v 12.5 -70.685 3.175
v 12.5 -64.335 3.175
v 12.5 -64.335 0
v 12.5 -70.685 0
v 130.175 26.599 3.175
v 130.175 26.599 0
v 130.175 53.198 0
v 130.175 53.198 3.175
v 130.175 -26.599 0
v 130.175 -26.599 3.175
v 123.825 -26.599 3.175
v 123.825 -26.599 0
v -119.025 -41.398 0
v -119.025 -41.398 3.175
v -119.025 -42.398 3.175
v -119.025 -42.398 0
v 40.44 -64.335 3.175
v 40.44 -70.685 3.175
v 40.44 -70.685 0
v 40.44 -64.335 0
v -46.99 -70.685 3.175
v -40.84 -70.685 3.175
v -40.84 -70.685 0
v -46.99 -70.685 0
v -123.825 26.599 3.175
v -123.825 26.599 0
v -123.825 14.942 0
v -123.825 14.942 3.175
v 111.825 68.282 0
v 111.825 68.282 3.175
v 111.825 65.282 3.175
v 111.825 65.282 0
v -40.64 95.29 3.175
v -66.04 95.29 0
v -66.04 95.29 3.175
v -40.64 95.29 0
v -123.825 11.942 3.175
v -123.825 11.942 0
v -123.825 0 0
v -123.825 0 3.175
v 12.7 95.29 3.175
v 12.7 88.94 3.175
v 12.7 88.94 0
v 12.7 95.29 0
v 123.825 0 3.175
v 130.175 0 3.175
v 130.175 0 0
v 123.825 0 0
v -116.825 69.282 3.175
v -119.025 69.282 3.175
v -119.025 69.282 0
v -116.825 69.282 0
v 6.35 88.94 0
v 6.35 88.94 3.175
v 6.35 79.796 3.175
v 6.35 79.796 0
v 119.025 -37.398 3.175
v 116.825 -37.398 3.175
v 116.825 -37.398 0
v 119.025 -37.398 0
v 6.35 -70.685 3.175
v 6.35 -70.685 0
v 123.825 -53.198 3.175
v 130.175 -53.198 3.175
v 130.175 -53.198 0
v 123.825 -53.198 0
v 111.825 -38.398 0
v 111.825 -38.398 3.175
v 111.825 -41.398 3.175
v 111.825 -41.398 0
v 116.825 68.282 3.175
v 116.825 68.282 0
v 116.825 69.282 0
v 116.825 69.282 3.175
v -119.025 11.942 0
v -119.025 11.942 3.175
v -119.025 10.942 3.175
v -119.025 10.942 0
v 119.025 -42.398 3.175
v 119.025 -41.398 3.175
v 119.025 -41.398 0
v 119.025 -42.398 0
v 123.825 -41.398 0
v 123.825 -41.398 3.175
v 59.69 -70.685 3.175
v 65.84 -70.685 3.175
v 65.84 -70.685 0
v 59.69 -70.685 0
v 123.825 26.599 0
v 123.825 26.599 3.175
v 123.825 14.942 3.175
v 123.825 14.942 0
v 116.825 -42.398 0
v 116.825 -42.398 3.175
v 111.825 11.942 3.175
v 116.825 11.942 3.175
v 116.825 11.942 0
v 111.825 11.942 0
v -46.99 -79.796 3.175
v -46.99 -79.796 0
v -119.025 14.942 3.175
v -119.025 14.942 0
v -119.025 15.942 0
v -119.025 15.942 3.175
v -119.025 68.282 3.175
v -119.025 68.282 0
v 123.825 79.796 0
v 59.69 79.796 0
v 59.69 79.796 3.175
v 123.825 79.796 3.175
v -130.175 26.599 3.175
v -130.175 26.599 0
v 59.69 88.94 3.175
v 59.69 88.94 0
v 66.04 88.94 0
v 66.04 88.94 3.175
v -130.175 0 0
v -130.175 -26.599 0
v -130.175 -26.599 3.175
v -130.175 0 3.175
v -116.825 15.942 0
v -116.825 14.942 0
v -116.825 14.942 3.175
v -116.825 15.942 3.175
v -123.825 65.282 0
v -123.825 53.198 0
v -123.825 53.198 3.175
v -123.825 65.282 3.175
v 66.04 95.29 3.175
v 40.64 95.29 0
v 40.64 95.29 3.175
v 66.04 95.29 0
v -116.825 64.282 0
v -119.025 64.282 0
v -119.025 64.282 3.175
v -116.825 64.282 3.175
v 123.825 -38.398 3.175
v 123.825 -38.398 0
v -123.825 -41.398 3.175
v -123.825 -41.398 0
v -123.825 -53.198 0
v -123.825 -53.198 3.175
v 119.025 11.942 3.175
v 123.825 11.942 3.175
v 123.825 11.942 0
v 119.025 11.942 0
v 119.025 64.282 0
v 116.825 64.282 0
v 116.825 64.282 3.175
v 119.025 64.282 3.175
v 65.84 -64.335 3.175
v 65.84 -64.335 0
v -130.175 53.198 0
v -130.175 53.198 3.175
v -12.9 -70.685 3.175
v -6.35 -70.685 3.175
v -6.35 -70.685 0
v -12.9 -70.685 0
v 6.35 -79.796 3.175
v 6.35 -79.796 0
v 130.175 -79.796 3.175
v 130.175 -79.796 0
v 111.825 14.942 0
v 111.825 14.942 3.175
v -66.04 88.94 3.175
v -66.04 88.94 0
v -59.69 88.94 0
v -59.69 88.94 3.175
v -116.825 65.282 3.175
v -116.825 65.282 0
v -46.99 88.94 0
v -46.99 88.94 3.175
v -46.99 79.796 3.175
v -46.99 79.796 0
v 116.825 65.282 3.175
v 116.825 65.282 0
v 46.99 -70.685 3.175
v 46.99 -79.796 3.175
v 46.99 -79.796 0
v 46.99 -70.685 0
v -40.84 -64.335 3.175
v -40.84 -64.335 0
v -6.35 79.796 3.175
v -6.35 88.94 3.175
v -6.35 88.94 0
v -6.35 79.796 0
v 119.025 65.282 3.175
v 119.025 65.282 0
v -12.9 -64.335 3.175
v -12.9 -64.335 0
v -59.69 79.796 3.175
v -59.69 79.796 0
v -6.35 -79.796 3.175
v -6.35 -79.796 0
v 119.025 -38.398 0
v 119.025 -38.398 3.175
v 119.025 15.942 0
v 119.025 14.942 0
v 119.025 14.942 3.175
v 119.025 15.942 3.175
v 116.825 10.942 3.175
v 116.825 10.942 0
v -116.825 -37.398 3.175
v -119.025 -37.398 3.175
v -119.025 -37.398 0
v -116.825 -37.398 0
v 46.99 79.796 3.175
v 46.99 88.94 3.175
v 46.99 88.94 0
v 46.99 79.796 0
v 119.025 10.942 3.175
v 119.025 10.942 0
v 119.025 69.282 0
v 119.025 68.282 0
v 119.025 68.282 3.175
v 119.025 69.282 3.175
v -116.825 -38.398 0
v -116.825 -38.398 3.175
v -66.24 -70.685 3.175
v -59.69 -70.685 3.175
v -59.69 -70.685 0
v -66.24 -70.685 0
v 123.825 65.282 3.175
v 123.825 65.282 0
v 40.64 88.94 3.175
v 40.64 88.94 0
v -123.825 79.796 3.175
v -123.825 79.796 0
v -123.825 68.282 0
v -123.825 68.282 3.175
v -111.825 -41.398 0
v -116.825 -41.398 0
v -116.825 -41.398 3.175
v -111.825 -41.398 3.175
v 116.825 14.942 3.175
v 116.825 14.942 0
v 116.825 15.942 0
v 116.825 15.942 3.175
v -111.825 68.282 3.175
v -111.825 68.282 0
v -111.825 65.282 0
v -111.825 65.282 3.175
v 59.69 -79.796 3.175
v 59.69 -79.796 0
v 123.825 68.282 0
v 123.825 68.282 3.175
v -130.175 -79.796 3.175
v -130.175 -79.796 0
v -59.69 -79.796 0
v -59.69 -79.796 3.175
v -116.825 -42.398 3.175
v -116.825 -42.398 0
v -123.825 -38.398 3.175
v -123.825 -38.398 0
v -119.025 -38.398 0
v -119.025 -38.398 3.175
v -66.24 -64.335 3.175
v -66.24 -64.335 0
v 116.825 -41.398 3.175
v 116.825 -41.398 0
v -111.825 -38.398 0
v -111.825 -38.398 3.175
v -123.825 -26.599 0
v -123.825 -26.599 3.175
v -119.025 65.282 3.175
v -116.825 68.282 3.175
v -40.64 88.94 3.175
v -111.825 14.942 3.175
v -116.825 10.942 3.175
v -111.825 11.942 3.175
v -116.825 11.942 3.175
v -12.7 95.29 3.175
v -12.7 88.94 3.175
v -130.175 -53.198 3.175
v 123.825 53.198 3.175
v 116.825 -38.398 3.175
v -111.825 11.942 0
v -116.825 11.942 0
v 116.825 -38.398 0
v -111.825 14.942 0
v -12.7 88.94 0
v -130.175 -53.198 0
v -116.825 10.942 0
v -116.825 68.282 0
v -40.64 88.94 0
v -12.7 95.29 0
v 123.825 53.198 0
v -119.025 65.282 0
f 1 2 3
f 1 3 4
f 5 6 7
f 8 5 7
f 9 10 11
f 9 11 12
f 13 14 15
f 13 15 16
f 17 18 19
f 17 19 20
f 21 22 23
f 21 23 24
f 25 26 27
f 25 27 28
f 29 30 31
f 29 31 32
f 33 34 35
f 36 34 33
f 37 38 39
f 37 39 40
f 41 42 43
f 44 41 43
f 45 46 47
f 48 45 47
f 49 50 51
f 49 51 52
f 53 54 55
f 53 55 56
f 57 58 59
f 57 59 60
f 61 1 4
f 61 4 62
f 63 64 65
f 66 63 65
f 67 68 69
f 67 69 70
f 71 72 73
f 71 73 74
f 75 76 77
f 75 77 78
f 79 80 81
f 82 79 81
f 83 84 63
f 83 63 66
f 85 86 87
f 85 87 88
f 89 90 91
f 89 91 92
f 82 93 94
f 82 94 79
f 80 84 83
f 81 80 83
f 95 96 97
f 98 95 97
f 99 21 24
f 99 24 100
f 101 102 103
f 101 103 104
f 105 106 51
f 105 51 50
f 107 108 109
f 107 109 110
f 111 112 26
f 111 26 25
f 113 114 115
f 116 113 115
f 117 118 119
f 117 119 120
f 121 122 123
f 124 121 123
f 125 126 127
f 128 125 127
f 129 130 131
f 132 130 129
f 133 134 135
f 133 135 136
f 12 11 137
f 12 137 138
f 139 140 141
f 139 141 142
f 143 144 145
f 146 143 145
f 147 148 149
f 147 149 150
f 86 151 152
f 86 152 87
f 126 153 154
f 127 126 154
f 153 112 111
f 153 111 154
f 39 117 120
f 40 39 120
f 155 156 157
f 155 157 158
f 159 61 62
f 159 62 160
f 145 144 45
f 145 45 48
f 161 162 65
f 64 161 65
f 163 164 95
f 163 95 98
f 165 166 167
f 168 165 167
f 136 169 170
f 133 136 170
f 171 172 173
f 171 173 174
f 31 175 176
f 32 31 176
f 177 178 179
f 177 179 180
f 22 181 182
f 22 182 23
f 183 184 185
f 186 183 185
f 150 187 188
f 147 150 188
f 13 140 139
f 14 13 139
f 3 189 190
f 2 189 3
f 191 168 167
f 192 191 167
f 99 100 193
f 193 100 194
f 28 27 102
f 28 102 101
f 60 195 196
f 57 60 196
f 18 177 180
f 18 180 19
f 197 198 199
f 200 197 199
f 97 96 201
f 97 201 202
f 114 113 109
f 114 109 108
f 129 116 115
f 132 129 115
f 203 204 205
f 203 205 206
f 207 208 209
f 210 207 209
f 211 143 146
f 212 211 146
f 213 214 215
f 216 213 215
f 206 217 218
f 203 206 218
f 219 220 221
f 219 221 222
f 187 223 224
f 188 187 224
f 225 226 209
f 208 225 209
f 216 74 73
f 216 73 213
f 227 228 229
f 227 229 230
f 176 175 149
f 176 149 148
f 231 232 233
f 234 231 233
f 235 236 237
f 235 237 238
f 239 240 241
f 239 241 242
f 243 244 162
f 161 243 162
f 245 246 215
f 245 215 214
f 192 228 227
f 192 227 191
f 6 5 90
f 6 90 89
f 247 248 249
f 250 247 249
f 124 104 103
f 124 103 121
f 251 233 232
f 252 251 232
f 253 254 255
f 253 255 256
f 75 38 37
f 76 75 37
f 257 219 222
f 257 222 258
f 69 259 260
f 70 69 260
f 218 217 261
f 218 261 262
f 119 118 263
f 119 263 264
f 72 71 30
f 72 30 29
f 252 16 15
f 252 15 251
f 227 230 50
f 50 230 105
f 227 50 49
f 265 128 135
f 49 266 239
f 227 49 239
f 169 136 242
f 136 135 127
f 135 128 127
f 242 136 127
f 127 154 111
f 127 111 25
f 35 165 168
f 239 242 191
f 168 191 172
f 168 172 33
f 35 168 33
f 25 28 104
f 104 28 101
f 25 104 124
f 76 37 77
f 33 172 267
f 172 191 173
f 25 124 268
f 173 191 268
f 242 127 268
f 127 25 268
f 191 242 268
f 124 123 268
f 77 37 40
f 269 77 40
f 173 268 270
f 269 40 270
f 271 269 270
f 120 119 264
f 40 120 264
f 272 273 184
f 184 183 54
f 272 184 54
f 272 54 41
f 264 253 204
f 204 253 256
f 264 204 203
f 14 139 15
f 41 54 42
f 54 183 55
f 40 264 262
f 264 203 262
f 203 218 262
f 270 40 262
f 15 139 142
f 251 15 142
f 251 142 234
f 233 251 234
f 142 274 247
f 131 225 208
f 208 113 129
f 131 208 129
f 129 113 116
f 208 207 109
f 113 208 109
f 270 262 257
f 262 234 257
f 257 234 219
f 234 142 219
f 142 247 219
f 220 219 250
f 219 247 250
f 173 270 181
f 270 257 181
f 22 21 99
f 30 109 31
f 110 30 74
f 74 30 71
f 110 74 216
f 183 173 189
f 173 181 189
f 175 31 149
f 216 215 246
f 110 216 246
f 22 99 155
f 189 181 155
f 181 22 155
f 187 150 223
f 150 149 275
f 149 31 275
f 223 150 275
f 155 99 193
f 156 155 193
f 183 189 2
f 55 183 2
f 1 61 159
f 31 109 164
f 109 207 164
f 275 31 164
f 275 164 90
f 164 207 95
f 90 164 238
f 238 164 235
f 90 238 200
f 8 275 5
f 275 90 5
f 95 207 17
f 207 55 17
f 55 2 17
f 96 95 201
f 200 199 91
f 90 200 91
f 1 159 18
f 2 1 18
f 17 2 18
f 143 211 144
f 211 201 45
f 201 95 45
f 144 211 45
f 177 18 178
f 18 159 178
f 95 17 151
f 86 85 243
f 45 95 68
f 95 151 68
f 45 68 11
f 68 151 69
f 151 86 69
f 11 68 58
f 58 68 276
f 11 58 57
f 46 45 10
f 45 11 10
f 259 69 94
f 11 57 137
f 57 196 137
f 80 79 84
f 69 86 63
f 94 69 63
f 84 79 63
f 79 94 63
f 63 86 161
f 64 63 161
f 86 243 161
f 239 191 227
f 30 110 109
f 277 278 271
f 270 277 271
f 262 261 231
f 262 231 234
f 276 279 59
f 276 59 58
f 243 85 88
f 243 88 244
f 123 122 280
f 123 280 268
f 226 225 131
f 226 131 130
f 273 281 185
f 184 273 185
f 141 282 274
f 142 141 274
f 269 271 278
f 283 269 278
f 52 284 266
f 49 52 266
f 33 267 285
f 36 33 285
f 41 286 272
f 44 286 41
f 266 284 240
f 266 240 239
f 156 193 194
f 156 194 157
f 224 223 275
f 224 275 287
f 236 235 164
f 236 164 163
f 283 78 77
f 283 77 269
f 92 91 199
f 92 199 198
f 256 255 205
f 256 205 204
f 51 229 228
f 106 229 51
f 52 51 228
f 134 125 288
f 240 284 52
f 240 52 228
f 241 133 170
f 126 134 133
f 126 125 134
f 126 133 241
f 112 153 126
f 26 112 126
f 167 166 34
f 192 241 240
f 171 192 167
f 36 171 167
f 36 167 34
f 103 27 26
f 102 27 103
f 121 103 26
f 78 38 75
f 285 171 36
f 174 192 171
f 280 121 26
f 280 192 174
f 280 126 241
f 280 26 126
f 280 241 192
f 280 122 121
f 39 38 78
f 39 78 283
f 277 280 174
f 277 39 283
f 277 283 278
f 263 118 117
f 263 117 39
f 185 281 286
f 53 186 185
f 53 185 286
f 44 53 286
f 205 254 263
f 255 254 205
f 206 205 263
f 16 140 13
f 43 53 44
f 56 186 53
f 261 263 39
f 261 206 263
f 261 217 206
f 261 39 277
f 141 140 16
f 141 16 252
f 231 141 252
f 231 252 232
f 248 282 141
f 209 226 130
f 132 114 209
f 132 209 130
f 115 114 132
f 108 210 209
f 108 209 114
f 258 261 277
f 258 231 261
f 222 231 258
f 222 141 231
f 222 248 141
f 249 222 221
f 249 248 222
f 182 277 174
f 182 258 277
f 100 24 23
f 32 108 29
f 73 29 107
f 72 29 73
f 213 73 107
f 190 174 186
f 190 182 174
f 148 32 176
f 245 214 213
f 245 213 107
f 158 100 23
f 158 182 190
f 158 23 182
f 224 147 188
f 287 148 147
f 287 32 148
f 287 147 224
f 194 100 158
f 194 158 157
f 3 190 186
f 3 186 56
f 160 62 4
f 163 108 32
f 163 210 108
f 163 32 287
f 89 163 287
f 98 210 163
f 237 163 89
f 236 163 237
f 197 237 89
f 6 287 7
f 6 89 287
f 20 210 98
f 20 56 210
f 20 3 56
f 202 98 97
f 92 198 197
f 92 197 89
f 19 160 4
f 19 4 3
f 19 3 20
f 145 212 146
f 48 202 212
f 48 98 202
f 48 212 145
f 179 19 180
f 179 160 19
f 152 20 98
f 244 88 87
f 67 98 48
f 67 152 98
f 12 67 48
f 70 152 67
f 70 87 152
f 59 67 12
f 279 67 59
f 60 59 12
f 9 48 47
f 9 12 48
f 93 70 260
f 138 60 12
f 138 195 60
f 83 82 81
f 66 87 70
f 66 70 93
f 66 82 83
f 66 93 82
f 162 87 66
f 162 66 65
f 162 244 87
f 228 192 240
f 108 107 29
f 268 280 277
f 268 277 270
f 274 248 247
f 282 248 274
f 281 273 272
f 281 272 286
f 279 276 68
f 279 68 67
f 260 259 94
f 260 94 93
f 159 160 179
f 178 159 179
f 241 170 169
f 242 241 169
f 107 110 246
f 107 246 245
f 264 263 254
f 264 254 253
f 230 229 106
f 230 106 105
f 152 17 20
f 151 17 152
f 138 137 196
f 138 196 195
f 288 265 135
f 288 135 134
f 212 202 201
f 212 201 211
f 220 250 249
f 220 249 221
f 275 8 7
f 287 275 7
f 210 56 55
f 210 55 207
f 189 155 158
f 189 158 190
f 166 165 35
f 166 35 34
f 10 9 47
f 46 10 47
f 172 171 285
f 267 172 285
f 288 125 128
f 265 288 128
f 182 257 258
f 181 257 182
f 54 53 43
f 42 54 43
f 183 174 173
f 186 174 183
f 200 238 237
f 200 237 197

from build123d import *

# Parameters (mm, degrees)
SKETCH1_W           = 260.35
SKETCH1_H           = 159.592906802
BOSS_EXTRUDE1_DEPTH = 3.175
SKETCH2_W           = 3.175
SKETCH2_H           = 26.5988178
CUT_EXTRUDE1_DEPTH  = 6.35
LPATTERN1_COUNT     = 3
LPATTERN1_PITCH     = 53.19763554
SKETCH3_W           = 3.175
SKETCH3_H           = 26.59881777
CUT_EXTRUDE3_DEPTH  = 6.35
LPATTERN3_COUNT     = 3
LPATTERN3_PITCH     = 53.19763554
SKETCH5_W           = 3.175
SKETCH5_H           = 3
CUT_EXTRUDE4_DEPTH  = 12
SKETCH6_W           = 2.2
SKETCH6_H           = 3.175
CUT_EXTRUDE5_DEPTH  = 1
SKETCH8_W           = 2.2
SKETCH8_H           = 3.175
CUT_EXTRUDE6_DEPTH  = 1
LPATTERN5_COUNT     = 3
LPATTERN5_PITCH     = 53.34
SKETCH9_W           = 3.175
SKETCH9_H           = 3
CUT_EXTRUDE7_DEPTH  = 12
SKETCH10_W          = 2.2
SKETCH10_H          = 3.175
CUT_EXTRUDE8_DEPTH  = 1
SKETCH11_W          = 2.2
SKETCH11_H          = 3.175
CUT_EXTRUDE9_DEPTH  = 1
LPATTERN6_COUNT     = 3
LPATTERN6_PITCH     = 53.34
CUT_EXTRUDE10_DEPTH = 153.718974674
LPATTERN7_COUNT     = 2
LPATTERN7_PITCH     = 53.34
LPATTERN8_COUNT     = 2
LPATTERN8_PITCH     = 53.34
SKETCH15_W          = 12.7
SKETCH15_H          = 3.175
BOSS_EXTRUDE2_DEPTH = 9.144
SKETCH16_W          = 25.4
SKETCH16_H          = 3.175
BOSS_EXTRUDE3_DEPTH = 6.35
LPATTERN9_COUNT     = 2
LPATTERN9_PITCH     = 53.34
LPATTERN10_COUNT    = 2
LPATTERN10_PITCH    = 53.34


with BuildPart() as part:
    # Sketch1 → Boss-Extrude1 (new body)
    with BuildSketch(Plane.XY):
        Rectangle(SKETCH1_W, SKETCH1_H)
    extrude(amount=BOSS_EXTRUDE1_DEPTH)

    # Sketch2 → Cut-Extrude1 (cut)
    with BuildSketch(Plane.ZY.offset(130.175)):
        with Locations((1.5875, 66.497044501)):
            Rectangle(SKETCH2_W, SKETCH2_H)
    cut_extrude1 = extrude(amount=-CUT_EXTRUDE1_DEPTH, mode=Mode.SUBTRACT)

    # LPattern1: Cut-Extrude1 ×3
    with Locations(*[(0, -i * LPATTERN1_PITCH, 0) for i in range(1, LPATTERN1_COUNT)]):
        add(cut_extrude1, mode=Mode.SUBTRACT)

    # Sketch3 → Cut-Extrude3 (cut)
    with BuildSketch(Plane(origin=(130.175, 0, 0), x_dir=(0, 0, -1), z_dir=(1, 0, 0))):
        with Locations((-1.5875, -39.898226818)):
            Rectangle(SKETCH3_W, SKETCH3_H)
    cut_extrude3 = extrude(amount=-CUT_EXTRUDE3_DEPTH, mode=Mode.SUBTRACT)

    # LPattern3: Cut-Extrude3 ×3
    with Locations(*[(0, i * LPATTERN3_PITCH, 0) for i in range(1, LPATTERN3_COUNT)]):
        add(cut_extrude3, mode=Mode.SUBTRACT)

    # Sketch5 → Cut-Extrude4 (cut)
    with BuildSketch(Plane.ZY.offset(123.825)):
        with Locations((1.5875, -39.898226579)):
            Rectangle(SKETCH5_W, SKETCH5_H)
    cut_extrude4 = extrude(amount=-CUT_EXTRUDE4_DEPTH, mode=Mode.SUBTRACT)

    # Sketch6 → Cut-Extrude5 (cut)
    with BuildSketch(Plane.XZ.offset(38.398226579)):
        with Locations((-117.925, 1.5875)):
            Rectangle(SKETCH6_W, SKETCH6_H)
    cut_extrude5 = extrude(amount=-CUT_EXTRUDE5_DEPTH, mode=Mode.SUBTRACT)

    # Sketch8 → Cut-Extrude6 (cut)
    with BuildSketch(Plane(origin=(0, -41.398226579, 0), x_dir=(1, 0, 0), z_dir=(0, 1, 0))):
        with Locations((-117.925, -1.5875)):
            Rectangle(SKETCH8_W, SKETCH8_H)
    cut_extrude6 = extrude(amount=-CUT_EXTRUDE6_DEPTH, mode=Mode.SUBTRACT)

    # LPattern5: Cut-Extrude4, Cut-Extrude5, Cut-Extrude6 ×3
    with Locations(*[(0, i * LPATTERN5_PITCH, 0) for i in range(1, LPATTERN5_COUNT)]):
        add(cut_extrude4, mode=Mode.SUBTRACT)
        add(cut_extrude5, mode=Mode.SUBTRACT)
        add(cut_extrude6, mode=Mode.SUBTRACT)

    # Sketch9 → Cut-Extrude7 (cut)
    with BuildSketch(Plane(origin=(123.825, 0, 0), x_dir=(0, 0, -1), z_dir=(1, 0, 0))):
        with Locations((-1.5875, -39.898226818)):
            Rectangle(SKETCH9_W, SKETCH9_H)
    cut_extrude7 = extrude(amount=-CUT_EXTRUDE7_DEPTH, mode=Mode.SUBTRACT)

    # Sketch10 → Cut-Extrude8 (cut)
    with BuildSketch(Plane.XZ.offset(38.398226818)):
        with Locations((117.925, 1.5875)):
            Rectangle(SKETCH10_W, SKETCH10_H)
    cut_extrude8 = extrude(amount=-CUT_EXTRUDE8_DEPTH, mode=Mode.SUBTRACT)

    # Sketch11 → Cut-Extrude9 (cut)
    with BuildSketch(Plane(origin=(0, -41.398226818, 0), x_dir=(1, 0, 0), z_dir=(0, 1, 0))):
        with Locations((117.925, -1.5875)):
            Rectangle(SKETCH11_W, SKETCH11_H)
    cut_extrude9 = extrude(amount=-CUT_EXTRUDE9_DEPTH, mode=Mode.SUBTRACT)

    # LPattern6: Cut-Extrude7, Cut-Extrude8, Cut-Extrude9 ×3
    with Locations(*[(0, i * LPATTERN6_PITCH, 0) for i in range(1, LPATTERN6_COUNT)]):
        add(cut_extrude7, mode=Mode.SUBTRACT)
        add(cut_extrude8, mode=Mode.SUBTRACT)
        add(cut_extrude9, mode=Mode.SUBTRACT)

    # Sketch4 → Cut-Extrude10 (cut, through all)
    with BuildSketch(Plane.XY.offset(3.175)):
        Polygon((-6.35, -79.796453401), (-6.35, -70.685115582), (-12.899606221, -70.685115582), (-12.899606221, -64.335115582), (12.500393779, -64.335115582), (12.500393779, -70.685115582), (6.35, -70.685115582), (6.35, -79.796453401), align=None)
    cut_extrude10 = extrude(amount=-CUT_EXTRUDE10_DEPTH, mode=Mode.SUBTRACT)

    # LPattern7: Cut-Extrude10 ×2
    with Locations(*[(-i * LPATTERN7_PITCH, 0, 0) for i in range(1, LPATTERN7_COUNT)]):
        add(cut_extrude10, mode=Mode.SUBTRACT)

    # LPattern8: Cut-Extrude10 ×2
    with Locations(*[(i * LPATTERN8_PITCH, 0, 0) for i in range(1, LPATTERN8_COUNT)]):
        add(cut_extrude10, mode=Mode.SUBTRACT)

    # Sketch15 → Boss-Extrude2 (add)
    with BuildSketch(Plane(origin=(0, 79.796453401, 0), x_dir=(1, 0, 0), z_dir=(0, 1, 0))):
        with Locations((0, -1.5875)):
            Rectangle(SKETCH15_W, SKETCH15_H)
    boss_extrude2 = extrude(amount=BOSS_EXTRUDE2_DEPTH)

    # Sketch16 → Boss-Extrude3 (add)
    with BuildSketch(Plane(origin=(0, 88.940453401, 0), x_dir=(1, 0, 0), z_dir=(0, 1, 0))):
        with Locations((0, -1.5875)):
            Rectangle(SKETCH16_W, SKETCH16_H)
    boss_extrude3 = extrude(amount=BOSS_EXTRUDE3_DEPTH)

    # LPattern9: Boss-Extrude2, Boss-Extrude3 ×2
    with Locations(*[(i * LPATTERN9_PITCH, 0, 0) for i in range(1, LPATTERN9_COUNT)]):
        add(boss_extrude2)
        add(boss_extrude3)

    # LPattern10: Boss-Extrude2, Boss-Extrude3 ×2
    with Locations(*[(-i * LPATTERN10_PITCH, 0, 0) for i in range(1, LPATTERN10_COUNT)]):
        add(boss_extrude2)
        add(boss_extrude3)


solid = part.part
